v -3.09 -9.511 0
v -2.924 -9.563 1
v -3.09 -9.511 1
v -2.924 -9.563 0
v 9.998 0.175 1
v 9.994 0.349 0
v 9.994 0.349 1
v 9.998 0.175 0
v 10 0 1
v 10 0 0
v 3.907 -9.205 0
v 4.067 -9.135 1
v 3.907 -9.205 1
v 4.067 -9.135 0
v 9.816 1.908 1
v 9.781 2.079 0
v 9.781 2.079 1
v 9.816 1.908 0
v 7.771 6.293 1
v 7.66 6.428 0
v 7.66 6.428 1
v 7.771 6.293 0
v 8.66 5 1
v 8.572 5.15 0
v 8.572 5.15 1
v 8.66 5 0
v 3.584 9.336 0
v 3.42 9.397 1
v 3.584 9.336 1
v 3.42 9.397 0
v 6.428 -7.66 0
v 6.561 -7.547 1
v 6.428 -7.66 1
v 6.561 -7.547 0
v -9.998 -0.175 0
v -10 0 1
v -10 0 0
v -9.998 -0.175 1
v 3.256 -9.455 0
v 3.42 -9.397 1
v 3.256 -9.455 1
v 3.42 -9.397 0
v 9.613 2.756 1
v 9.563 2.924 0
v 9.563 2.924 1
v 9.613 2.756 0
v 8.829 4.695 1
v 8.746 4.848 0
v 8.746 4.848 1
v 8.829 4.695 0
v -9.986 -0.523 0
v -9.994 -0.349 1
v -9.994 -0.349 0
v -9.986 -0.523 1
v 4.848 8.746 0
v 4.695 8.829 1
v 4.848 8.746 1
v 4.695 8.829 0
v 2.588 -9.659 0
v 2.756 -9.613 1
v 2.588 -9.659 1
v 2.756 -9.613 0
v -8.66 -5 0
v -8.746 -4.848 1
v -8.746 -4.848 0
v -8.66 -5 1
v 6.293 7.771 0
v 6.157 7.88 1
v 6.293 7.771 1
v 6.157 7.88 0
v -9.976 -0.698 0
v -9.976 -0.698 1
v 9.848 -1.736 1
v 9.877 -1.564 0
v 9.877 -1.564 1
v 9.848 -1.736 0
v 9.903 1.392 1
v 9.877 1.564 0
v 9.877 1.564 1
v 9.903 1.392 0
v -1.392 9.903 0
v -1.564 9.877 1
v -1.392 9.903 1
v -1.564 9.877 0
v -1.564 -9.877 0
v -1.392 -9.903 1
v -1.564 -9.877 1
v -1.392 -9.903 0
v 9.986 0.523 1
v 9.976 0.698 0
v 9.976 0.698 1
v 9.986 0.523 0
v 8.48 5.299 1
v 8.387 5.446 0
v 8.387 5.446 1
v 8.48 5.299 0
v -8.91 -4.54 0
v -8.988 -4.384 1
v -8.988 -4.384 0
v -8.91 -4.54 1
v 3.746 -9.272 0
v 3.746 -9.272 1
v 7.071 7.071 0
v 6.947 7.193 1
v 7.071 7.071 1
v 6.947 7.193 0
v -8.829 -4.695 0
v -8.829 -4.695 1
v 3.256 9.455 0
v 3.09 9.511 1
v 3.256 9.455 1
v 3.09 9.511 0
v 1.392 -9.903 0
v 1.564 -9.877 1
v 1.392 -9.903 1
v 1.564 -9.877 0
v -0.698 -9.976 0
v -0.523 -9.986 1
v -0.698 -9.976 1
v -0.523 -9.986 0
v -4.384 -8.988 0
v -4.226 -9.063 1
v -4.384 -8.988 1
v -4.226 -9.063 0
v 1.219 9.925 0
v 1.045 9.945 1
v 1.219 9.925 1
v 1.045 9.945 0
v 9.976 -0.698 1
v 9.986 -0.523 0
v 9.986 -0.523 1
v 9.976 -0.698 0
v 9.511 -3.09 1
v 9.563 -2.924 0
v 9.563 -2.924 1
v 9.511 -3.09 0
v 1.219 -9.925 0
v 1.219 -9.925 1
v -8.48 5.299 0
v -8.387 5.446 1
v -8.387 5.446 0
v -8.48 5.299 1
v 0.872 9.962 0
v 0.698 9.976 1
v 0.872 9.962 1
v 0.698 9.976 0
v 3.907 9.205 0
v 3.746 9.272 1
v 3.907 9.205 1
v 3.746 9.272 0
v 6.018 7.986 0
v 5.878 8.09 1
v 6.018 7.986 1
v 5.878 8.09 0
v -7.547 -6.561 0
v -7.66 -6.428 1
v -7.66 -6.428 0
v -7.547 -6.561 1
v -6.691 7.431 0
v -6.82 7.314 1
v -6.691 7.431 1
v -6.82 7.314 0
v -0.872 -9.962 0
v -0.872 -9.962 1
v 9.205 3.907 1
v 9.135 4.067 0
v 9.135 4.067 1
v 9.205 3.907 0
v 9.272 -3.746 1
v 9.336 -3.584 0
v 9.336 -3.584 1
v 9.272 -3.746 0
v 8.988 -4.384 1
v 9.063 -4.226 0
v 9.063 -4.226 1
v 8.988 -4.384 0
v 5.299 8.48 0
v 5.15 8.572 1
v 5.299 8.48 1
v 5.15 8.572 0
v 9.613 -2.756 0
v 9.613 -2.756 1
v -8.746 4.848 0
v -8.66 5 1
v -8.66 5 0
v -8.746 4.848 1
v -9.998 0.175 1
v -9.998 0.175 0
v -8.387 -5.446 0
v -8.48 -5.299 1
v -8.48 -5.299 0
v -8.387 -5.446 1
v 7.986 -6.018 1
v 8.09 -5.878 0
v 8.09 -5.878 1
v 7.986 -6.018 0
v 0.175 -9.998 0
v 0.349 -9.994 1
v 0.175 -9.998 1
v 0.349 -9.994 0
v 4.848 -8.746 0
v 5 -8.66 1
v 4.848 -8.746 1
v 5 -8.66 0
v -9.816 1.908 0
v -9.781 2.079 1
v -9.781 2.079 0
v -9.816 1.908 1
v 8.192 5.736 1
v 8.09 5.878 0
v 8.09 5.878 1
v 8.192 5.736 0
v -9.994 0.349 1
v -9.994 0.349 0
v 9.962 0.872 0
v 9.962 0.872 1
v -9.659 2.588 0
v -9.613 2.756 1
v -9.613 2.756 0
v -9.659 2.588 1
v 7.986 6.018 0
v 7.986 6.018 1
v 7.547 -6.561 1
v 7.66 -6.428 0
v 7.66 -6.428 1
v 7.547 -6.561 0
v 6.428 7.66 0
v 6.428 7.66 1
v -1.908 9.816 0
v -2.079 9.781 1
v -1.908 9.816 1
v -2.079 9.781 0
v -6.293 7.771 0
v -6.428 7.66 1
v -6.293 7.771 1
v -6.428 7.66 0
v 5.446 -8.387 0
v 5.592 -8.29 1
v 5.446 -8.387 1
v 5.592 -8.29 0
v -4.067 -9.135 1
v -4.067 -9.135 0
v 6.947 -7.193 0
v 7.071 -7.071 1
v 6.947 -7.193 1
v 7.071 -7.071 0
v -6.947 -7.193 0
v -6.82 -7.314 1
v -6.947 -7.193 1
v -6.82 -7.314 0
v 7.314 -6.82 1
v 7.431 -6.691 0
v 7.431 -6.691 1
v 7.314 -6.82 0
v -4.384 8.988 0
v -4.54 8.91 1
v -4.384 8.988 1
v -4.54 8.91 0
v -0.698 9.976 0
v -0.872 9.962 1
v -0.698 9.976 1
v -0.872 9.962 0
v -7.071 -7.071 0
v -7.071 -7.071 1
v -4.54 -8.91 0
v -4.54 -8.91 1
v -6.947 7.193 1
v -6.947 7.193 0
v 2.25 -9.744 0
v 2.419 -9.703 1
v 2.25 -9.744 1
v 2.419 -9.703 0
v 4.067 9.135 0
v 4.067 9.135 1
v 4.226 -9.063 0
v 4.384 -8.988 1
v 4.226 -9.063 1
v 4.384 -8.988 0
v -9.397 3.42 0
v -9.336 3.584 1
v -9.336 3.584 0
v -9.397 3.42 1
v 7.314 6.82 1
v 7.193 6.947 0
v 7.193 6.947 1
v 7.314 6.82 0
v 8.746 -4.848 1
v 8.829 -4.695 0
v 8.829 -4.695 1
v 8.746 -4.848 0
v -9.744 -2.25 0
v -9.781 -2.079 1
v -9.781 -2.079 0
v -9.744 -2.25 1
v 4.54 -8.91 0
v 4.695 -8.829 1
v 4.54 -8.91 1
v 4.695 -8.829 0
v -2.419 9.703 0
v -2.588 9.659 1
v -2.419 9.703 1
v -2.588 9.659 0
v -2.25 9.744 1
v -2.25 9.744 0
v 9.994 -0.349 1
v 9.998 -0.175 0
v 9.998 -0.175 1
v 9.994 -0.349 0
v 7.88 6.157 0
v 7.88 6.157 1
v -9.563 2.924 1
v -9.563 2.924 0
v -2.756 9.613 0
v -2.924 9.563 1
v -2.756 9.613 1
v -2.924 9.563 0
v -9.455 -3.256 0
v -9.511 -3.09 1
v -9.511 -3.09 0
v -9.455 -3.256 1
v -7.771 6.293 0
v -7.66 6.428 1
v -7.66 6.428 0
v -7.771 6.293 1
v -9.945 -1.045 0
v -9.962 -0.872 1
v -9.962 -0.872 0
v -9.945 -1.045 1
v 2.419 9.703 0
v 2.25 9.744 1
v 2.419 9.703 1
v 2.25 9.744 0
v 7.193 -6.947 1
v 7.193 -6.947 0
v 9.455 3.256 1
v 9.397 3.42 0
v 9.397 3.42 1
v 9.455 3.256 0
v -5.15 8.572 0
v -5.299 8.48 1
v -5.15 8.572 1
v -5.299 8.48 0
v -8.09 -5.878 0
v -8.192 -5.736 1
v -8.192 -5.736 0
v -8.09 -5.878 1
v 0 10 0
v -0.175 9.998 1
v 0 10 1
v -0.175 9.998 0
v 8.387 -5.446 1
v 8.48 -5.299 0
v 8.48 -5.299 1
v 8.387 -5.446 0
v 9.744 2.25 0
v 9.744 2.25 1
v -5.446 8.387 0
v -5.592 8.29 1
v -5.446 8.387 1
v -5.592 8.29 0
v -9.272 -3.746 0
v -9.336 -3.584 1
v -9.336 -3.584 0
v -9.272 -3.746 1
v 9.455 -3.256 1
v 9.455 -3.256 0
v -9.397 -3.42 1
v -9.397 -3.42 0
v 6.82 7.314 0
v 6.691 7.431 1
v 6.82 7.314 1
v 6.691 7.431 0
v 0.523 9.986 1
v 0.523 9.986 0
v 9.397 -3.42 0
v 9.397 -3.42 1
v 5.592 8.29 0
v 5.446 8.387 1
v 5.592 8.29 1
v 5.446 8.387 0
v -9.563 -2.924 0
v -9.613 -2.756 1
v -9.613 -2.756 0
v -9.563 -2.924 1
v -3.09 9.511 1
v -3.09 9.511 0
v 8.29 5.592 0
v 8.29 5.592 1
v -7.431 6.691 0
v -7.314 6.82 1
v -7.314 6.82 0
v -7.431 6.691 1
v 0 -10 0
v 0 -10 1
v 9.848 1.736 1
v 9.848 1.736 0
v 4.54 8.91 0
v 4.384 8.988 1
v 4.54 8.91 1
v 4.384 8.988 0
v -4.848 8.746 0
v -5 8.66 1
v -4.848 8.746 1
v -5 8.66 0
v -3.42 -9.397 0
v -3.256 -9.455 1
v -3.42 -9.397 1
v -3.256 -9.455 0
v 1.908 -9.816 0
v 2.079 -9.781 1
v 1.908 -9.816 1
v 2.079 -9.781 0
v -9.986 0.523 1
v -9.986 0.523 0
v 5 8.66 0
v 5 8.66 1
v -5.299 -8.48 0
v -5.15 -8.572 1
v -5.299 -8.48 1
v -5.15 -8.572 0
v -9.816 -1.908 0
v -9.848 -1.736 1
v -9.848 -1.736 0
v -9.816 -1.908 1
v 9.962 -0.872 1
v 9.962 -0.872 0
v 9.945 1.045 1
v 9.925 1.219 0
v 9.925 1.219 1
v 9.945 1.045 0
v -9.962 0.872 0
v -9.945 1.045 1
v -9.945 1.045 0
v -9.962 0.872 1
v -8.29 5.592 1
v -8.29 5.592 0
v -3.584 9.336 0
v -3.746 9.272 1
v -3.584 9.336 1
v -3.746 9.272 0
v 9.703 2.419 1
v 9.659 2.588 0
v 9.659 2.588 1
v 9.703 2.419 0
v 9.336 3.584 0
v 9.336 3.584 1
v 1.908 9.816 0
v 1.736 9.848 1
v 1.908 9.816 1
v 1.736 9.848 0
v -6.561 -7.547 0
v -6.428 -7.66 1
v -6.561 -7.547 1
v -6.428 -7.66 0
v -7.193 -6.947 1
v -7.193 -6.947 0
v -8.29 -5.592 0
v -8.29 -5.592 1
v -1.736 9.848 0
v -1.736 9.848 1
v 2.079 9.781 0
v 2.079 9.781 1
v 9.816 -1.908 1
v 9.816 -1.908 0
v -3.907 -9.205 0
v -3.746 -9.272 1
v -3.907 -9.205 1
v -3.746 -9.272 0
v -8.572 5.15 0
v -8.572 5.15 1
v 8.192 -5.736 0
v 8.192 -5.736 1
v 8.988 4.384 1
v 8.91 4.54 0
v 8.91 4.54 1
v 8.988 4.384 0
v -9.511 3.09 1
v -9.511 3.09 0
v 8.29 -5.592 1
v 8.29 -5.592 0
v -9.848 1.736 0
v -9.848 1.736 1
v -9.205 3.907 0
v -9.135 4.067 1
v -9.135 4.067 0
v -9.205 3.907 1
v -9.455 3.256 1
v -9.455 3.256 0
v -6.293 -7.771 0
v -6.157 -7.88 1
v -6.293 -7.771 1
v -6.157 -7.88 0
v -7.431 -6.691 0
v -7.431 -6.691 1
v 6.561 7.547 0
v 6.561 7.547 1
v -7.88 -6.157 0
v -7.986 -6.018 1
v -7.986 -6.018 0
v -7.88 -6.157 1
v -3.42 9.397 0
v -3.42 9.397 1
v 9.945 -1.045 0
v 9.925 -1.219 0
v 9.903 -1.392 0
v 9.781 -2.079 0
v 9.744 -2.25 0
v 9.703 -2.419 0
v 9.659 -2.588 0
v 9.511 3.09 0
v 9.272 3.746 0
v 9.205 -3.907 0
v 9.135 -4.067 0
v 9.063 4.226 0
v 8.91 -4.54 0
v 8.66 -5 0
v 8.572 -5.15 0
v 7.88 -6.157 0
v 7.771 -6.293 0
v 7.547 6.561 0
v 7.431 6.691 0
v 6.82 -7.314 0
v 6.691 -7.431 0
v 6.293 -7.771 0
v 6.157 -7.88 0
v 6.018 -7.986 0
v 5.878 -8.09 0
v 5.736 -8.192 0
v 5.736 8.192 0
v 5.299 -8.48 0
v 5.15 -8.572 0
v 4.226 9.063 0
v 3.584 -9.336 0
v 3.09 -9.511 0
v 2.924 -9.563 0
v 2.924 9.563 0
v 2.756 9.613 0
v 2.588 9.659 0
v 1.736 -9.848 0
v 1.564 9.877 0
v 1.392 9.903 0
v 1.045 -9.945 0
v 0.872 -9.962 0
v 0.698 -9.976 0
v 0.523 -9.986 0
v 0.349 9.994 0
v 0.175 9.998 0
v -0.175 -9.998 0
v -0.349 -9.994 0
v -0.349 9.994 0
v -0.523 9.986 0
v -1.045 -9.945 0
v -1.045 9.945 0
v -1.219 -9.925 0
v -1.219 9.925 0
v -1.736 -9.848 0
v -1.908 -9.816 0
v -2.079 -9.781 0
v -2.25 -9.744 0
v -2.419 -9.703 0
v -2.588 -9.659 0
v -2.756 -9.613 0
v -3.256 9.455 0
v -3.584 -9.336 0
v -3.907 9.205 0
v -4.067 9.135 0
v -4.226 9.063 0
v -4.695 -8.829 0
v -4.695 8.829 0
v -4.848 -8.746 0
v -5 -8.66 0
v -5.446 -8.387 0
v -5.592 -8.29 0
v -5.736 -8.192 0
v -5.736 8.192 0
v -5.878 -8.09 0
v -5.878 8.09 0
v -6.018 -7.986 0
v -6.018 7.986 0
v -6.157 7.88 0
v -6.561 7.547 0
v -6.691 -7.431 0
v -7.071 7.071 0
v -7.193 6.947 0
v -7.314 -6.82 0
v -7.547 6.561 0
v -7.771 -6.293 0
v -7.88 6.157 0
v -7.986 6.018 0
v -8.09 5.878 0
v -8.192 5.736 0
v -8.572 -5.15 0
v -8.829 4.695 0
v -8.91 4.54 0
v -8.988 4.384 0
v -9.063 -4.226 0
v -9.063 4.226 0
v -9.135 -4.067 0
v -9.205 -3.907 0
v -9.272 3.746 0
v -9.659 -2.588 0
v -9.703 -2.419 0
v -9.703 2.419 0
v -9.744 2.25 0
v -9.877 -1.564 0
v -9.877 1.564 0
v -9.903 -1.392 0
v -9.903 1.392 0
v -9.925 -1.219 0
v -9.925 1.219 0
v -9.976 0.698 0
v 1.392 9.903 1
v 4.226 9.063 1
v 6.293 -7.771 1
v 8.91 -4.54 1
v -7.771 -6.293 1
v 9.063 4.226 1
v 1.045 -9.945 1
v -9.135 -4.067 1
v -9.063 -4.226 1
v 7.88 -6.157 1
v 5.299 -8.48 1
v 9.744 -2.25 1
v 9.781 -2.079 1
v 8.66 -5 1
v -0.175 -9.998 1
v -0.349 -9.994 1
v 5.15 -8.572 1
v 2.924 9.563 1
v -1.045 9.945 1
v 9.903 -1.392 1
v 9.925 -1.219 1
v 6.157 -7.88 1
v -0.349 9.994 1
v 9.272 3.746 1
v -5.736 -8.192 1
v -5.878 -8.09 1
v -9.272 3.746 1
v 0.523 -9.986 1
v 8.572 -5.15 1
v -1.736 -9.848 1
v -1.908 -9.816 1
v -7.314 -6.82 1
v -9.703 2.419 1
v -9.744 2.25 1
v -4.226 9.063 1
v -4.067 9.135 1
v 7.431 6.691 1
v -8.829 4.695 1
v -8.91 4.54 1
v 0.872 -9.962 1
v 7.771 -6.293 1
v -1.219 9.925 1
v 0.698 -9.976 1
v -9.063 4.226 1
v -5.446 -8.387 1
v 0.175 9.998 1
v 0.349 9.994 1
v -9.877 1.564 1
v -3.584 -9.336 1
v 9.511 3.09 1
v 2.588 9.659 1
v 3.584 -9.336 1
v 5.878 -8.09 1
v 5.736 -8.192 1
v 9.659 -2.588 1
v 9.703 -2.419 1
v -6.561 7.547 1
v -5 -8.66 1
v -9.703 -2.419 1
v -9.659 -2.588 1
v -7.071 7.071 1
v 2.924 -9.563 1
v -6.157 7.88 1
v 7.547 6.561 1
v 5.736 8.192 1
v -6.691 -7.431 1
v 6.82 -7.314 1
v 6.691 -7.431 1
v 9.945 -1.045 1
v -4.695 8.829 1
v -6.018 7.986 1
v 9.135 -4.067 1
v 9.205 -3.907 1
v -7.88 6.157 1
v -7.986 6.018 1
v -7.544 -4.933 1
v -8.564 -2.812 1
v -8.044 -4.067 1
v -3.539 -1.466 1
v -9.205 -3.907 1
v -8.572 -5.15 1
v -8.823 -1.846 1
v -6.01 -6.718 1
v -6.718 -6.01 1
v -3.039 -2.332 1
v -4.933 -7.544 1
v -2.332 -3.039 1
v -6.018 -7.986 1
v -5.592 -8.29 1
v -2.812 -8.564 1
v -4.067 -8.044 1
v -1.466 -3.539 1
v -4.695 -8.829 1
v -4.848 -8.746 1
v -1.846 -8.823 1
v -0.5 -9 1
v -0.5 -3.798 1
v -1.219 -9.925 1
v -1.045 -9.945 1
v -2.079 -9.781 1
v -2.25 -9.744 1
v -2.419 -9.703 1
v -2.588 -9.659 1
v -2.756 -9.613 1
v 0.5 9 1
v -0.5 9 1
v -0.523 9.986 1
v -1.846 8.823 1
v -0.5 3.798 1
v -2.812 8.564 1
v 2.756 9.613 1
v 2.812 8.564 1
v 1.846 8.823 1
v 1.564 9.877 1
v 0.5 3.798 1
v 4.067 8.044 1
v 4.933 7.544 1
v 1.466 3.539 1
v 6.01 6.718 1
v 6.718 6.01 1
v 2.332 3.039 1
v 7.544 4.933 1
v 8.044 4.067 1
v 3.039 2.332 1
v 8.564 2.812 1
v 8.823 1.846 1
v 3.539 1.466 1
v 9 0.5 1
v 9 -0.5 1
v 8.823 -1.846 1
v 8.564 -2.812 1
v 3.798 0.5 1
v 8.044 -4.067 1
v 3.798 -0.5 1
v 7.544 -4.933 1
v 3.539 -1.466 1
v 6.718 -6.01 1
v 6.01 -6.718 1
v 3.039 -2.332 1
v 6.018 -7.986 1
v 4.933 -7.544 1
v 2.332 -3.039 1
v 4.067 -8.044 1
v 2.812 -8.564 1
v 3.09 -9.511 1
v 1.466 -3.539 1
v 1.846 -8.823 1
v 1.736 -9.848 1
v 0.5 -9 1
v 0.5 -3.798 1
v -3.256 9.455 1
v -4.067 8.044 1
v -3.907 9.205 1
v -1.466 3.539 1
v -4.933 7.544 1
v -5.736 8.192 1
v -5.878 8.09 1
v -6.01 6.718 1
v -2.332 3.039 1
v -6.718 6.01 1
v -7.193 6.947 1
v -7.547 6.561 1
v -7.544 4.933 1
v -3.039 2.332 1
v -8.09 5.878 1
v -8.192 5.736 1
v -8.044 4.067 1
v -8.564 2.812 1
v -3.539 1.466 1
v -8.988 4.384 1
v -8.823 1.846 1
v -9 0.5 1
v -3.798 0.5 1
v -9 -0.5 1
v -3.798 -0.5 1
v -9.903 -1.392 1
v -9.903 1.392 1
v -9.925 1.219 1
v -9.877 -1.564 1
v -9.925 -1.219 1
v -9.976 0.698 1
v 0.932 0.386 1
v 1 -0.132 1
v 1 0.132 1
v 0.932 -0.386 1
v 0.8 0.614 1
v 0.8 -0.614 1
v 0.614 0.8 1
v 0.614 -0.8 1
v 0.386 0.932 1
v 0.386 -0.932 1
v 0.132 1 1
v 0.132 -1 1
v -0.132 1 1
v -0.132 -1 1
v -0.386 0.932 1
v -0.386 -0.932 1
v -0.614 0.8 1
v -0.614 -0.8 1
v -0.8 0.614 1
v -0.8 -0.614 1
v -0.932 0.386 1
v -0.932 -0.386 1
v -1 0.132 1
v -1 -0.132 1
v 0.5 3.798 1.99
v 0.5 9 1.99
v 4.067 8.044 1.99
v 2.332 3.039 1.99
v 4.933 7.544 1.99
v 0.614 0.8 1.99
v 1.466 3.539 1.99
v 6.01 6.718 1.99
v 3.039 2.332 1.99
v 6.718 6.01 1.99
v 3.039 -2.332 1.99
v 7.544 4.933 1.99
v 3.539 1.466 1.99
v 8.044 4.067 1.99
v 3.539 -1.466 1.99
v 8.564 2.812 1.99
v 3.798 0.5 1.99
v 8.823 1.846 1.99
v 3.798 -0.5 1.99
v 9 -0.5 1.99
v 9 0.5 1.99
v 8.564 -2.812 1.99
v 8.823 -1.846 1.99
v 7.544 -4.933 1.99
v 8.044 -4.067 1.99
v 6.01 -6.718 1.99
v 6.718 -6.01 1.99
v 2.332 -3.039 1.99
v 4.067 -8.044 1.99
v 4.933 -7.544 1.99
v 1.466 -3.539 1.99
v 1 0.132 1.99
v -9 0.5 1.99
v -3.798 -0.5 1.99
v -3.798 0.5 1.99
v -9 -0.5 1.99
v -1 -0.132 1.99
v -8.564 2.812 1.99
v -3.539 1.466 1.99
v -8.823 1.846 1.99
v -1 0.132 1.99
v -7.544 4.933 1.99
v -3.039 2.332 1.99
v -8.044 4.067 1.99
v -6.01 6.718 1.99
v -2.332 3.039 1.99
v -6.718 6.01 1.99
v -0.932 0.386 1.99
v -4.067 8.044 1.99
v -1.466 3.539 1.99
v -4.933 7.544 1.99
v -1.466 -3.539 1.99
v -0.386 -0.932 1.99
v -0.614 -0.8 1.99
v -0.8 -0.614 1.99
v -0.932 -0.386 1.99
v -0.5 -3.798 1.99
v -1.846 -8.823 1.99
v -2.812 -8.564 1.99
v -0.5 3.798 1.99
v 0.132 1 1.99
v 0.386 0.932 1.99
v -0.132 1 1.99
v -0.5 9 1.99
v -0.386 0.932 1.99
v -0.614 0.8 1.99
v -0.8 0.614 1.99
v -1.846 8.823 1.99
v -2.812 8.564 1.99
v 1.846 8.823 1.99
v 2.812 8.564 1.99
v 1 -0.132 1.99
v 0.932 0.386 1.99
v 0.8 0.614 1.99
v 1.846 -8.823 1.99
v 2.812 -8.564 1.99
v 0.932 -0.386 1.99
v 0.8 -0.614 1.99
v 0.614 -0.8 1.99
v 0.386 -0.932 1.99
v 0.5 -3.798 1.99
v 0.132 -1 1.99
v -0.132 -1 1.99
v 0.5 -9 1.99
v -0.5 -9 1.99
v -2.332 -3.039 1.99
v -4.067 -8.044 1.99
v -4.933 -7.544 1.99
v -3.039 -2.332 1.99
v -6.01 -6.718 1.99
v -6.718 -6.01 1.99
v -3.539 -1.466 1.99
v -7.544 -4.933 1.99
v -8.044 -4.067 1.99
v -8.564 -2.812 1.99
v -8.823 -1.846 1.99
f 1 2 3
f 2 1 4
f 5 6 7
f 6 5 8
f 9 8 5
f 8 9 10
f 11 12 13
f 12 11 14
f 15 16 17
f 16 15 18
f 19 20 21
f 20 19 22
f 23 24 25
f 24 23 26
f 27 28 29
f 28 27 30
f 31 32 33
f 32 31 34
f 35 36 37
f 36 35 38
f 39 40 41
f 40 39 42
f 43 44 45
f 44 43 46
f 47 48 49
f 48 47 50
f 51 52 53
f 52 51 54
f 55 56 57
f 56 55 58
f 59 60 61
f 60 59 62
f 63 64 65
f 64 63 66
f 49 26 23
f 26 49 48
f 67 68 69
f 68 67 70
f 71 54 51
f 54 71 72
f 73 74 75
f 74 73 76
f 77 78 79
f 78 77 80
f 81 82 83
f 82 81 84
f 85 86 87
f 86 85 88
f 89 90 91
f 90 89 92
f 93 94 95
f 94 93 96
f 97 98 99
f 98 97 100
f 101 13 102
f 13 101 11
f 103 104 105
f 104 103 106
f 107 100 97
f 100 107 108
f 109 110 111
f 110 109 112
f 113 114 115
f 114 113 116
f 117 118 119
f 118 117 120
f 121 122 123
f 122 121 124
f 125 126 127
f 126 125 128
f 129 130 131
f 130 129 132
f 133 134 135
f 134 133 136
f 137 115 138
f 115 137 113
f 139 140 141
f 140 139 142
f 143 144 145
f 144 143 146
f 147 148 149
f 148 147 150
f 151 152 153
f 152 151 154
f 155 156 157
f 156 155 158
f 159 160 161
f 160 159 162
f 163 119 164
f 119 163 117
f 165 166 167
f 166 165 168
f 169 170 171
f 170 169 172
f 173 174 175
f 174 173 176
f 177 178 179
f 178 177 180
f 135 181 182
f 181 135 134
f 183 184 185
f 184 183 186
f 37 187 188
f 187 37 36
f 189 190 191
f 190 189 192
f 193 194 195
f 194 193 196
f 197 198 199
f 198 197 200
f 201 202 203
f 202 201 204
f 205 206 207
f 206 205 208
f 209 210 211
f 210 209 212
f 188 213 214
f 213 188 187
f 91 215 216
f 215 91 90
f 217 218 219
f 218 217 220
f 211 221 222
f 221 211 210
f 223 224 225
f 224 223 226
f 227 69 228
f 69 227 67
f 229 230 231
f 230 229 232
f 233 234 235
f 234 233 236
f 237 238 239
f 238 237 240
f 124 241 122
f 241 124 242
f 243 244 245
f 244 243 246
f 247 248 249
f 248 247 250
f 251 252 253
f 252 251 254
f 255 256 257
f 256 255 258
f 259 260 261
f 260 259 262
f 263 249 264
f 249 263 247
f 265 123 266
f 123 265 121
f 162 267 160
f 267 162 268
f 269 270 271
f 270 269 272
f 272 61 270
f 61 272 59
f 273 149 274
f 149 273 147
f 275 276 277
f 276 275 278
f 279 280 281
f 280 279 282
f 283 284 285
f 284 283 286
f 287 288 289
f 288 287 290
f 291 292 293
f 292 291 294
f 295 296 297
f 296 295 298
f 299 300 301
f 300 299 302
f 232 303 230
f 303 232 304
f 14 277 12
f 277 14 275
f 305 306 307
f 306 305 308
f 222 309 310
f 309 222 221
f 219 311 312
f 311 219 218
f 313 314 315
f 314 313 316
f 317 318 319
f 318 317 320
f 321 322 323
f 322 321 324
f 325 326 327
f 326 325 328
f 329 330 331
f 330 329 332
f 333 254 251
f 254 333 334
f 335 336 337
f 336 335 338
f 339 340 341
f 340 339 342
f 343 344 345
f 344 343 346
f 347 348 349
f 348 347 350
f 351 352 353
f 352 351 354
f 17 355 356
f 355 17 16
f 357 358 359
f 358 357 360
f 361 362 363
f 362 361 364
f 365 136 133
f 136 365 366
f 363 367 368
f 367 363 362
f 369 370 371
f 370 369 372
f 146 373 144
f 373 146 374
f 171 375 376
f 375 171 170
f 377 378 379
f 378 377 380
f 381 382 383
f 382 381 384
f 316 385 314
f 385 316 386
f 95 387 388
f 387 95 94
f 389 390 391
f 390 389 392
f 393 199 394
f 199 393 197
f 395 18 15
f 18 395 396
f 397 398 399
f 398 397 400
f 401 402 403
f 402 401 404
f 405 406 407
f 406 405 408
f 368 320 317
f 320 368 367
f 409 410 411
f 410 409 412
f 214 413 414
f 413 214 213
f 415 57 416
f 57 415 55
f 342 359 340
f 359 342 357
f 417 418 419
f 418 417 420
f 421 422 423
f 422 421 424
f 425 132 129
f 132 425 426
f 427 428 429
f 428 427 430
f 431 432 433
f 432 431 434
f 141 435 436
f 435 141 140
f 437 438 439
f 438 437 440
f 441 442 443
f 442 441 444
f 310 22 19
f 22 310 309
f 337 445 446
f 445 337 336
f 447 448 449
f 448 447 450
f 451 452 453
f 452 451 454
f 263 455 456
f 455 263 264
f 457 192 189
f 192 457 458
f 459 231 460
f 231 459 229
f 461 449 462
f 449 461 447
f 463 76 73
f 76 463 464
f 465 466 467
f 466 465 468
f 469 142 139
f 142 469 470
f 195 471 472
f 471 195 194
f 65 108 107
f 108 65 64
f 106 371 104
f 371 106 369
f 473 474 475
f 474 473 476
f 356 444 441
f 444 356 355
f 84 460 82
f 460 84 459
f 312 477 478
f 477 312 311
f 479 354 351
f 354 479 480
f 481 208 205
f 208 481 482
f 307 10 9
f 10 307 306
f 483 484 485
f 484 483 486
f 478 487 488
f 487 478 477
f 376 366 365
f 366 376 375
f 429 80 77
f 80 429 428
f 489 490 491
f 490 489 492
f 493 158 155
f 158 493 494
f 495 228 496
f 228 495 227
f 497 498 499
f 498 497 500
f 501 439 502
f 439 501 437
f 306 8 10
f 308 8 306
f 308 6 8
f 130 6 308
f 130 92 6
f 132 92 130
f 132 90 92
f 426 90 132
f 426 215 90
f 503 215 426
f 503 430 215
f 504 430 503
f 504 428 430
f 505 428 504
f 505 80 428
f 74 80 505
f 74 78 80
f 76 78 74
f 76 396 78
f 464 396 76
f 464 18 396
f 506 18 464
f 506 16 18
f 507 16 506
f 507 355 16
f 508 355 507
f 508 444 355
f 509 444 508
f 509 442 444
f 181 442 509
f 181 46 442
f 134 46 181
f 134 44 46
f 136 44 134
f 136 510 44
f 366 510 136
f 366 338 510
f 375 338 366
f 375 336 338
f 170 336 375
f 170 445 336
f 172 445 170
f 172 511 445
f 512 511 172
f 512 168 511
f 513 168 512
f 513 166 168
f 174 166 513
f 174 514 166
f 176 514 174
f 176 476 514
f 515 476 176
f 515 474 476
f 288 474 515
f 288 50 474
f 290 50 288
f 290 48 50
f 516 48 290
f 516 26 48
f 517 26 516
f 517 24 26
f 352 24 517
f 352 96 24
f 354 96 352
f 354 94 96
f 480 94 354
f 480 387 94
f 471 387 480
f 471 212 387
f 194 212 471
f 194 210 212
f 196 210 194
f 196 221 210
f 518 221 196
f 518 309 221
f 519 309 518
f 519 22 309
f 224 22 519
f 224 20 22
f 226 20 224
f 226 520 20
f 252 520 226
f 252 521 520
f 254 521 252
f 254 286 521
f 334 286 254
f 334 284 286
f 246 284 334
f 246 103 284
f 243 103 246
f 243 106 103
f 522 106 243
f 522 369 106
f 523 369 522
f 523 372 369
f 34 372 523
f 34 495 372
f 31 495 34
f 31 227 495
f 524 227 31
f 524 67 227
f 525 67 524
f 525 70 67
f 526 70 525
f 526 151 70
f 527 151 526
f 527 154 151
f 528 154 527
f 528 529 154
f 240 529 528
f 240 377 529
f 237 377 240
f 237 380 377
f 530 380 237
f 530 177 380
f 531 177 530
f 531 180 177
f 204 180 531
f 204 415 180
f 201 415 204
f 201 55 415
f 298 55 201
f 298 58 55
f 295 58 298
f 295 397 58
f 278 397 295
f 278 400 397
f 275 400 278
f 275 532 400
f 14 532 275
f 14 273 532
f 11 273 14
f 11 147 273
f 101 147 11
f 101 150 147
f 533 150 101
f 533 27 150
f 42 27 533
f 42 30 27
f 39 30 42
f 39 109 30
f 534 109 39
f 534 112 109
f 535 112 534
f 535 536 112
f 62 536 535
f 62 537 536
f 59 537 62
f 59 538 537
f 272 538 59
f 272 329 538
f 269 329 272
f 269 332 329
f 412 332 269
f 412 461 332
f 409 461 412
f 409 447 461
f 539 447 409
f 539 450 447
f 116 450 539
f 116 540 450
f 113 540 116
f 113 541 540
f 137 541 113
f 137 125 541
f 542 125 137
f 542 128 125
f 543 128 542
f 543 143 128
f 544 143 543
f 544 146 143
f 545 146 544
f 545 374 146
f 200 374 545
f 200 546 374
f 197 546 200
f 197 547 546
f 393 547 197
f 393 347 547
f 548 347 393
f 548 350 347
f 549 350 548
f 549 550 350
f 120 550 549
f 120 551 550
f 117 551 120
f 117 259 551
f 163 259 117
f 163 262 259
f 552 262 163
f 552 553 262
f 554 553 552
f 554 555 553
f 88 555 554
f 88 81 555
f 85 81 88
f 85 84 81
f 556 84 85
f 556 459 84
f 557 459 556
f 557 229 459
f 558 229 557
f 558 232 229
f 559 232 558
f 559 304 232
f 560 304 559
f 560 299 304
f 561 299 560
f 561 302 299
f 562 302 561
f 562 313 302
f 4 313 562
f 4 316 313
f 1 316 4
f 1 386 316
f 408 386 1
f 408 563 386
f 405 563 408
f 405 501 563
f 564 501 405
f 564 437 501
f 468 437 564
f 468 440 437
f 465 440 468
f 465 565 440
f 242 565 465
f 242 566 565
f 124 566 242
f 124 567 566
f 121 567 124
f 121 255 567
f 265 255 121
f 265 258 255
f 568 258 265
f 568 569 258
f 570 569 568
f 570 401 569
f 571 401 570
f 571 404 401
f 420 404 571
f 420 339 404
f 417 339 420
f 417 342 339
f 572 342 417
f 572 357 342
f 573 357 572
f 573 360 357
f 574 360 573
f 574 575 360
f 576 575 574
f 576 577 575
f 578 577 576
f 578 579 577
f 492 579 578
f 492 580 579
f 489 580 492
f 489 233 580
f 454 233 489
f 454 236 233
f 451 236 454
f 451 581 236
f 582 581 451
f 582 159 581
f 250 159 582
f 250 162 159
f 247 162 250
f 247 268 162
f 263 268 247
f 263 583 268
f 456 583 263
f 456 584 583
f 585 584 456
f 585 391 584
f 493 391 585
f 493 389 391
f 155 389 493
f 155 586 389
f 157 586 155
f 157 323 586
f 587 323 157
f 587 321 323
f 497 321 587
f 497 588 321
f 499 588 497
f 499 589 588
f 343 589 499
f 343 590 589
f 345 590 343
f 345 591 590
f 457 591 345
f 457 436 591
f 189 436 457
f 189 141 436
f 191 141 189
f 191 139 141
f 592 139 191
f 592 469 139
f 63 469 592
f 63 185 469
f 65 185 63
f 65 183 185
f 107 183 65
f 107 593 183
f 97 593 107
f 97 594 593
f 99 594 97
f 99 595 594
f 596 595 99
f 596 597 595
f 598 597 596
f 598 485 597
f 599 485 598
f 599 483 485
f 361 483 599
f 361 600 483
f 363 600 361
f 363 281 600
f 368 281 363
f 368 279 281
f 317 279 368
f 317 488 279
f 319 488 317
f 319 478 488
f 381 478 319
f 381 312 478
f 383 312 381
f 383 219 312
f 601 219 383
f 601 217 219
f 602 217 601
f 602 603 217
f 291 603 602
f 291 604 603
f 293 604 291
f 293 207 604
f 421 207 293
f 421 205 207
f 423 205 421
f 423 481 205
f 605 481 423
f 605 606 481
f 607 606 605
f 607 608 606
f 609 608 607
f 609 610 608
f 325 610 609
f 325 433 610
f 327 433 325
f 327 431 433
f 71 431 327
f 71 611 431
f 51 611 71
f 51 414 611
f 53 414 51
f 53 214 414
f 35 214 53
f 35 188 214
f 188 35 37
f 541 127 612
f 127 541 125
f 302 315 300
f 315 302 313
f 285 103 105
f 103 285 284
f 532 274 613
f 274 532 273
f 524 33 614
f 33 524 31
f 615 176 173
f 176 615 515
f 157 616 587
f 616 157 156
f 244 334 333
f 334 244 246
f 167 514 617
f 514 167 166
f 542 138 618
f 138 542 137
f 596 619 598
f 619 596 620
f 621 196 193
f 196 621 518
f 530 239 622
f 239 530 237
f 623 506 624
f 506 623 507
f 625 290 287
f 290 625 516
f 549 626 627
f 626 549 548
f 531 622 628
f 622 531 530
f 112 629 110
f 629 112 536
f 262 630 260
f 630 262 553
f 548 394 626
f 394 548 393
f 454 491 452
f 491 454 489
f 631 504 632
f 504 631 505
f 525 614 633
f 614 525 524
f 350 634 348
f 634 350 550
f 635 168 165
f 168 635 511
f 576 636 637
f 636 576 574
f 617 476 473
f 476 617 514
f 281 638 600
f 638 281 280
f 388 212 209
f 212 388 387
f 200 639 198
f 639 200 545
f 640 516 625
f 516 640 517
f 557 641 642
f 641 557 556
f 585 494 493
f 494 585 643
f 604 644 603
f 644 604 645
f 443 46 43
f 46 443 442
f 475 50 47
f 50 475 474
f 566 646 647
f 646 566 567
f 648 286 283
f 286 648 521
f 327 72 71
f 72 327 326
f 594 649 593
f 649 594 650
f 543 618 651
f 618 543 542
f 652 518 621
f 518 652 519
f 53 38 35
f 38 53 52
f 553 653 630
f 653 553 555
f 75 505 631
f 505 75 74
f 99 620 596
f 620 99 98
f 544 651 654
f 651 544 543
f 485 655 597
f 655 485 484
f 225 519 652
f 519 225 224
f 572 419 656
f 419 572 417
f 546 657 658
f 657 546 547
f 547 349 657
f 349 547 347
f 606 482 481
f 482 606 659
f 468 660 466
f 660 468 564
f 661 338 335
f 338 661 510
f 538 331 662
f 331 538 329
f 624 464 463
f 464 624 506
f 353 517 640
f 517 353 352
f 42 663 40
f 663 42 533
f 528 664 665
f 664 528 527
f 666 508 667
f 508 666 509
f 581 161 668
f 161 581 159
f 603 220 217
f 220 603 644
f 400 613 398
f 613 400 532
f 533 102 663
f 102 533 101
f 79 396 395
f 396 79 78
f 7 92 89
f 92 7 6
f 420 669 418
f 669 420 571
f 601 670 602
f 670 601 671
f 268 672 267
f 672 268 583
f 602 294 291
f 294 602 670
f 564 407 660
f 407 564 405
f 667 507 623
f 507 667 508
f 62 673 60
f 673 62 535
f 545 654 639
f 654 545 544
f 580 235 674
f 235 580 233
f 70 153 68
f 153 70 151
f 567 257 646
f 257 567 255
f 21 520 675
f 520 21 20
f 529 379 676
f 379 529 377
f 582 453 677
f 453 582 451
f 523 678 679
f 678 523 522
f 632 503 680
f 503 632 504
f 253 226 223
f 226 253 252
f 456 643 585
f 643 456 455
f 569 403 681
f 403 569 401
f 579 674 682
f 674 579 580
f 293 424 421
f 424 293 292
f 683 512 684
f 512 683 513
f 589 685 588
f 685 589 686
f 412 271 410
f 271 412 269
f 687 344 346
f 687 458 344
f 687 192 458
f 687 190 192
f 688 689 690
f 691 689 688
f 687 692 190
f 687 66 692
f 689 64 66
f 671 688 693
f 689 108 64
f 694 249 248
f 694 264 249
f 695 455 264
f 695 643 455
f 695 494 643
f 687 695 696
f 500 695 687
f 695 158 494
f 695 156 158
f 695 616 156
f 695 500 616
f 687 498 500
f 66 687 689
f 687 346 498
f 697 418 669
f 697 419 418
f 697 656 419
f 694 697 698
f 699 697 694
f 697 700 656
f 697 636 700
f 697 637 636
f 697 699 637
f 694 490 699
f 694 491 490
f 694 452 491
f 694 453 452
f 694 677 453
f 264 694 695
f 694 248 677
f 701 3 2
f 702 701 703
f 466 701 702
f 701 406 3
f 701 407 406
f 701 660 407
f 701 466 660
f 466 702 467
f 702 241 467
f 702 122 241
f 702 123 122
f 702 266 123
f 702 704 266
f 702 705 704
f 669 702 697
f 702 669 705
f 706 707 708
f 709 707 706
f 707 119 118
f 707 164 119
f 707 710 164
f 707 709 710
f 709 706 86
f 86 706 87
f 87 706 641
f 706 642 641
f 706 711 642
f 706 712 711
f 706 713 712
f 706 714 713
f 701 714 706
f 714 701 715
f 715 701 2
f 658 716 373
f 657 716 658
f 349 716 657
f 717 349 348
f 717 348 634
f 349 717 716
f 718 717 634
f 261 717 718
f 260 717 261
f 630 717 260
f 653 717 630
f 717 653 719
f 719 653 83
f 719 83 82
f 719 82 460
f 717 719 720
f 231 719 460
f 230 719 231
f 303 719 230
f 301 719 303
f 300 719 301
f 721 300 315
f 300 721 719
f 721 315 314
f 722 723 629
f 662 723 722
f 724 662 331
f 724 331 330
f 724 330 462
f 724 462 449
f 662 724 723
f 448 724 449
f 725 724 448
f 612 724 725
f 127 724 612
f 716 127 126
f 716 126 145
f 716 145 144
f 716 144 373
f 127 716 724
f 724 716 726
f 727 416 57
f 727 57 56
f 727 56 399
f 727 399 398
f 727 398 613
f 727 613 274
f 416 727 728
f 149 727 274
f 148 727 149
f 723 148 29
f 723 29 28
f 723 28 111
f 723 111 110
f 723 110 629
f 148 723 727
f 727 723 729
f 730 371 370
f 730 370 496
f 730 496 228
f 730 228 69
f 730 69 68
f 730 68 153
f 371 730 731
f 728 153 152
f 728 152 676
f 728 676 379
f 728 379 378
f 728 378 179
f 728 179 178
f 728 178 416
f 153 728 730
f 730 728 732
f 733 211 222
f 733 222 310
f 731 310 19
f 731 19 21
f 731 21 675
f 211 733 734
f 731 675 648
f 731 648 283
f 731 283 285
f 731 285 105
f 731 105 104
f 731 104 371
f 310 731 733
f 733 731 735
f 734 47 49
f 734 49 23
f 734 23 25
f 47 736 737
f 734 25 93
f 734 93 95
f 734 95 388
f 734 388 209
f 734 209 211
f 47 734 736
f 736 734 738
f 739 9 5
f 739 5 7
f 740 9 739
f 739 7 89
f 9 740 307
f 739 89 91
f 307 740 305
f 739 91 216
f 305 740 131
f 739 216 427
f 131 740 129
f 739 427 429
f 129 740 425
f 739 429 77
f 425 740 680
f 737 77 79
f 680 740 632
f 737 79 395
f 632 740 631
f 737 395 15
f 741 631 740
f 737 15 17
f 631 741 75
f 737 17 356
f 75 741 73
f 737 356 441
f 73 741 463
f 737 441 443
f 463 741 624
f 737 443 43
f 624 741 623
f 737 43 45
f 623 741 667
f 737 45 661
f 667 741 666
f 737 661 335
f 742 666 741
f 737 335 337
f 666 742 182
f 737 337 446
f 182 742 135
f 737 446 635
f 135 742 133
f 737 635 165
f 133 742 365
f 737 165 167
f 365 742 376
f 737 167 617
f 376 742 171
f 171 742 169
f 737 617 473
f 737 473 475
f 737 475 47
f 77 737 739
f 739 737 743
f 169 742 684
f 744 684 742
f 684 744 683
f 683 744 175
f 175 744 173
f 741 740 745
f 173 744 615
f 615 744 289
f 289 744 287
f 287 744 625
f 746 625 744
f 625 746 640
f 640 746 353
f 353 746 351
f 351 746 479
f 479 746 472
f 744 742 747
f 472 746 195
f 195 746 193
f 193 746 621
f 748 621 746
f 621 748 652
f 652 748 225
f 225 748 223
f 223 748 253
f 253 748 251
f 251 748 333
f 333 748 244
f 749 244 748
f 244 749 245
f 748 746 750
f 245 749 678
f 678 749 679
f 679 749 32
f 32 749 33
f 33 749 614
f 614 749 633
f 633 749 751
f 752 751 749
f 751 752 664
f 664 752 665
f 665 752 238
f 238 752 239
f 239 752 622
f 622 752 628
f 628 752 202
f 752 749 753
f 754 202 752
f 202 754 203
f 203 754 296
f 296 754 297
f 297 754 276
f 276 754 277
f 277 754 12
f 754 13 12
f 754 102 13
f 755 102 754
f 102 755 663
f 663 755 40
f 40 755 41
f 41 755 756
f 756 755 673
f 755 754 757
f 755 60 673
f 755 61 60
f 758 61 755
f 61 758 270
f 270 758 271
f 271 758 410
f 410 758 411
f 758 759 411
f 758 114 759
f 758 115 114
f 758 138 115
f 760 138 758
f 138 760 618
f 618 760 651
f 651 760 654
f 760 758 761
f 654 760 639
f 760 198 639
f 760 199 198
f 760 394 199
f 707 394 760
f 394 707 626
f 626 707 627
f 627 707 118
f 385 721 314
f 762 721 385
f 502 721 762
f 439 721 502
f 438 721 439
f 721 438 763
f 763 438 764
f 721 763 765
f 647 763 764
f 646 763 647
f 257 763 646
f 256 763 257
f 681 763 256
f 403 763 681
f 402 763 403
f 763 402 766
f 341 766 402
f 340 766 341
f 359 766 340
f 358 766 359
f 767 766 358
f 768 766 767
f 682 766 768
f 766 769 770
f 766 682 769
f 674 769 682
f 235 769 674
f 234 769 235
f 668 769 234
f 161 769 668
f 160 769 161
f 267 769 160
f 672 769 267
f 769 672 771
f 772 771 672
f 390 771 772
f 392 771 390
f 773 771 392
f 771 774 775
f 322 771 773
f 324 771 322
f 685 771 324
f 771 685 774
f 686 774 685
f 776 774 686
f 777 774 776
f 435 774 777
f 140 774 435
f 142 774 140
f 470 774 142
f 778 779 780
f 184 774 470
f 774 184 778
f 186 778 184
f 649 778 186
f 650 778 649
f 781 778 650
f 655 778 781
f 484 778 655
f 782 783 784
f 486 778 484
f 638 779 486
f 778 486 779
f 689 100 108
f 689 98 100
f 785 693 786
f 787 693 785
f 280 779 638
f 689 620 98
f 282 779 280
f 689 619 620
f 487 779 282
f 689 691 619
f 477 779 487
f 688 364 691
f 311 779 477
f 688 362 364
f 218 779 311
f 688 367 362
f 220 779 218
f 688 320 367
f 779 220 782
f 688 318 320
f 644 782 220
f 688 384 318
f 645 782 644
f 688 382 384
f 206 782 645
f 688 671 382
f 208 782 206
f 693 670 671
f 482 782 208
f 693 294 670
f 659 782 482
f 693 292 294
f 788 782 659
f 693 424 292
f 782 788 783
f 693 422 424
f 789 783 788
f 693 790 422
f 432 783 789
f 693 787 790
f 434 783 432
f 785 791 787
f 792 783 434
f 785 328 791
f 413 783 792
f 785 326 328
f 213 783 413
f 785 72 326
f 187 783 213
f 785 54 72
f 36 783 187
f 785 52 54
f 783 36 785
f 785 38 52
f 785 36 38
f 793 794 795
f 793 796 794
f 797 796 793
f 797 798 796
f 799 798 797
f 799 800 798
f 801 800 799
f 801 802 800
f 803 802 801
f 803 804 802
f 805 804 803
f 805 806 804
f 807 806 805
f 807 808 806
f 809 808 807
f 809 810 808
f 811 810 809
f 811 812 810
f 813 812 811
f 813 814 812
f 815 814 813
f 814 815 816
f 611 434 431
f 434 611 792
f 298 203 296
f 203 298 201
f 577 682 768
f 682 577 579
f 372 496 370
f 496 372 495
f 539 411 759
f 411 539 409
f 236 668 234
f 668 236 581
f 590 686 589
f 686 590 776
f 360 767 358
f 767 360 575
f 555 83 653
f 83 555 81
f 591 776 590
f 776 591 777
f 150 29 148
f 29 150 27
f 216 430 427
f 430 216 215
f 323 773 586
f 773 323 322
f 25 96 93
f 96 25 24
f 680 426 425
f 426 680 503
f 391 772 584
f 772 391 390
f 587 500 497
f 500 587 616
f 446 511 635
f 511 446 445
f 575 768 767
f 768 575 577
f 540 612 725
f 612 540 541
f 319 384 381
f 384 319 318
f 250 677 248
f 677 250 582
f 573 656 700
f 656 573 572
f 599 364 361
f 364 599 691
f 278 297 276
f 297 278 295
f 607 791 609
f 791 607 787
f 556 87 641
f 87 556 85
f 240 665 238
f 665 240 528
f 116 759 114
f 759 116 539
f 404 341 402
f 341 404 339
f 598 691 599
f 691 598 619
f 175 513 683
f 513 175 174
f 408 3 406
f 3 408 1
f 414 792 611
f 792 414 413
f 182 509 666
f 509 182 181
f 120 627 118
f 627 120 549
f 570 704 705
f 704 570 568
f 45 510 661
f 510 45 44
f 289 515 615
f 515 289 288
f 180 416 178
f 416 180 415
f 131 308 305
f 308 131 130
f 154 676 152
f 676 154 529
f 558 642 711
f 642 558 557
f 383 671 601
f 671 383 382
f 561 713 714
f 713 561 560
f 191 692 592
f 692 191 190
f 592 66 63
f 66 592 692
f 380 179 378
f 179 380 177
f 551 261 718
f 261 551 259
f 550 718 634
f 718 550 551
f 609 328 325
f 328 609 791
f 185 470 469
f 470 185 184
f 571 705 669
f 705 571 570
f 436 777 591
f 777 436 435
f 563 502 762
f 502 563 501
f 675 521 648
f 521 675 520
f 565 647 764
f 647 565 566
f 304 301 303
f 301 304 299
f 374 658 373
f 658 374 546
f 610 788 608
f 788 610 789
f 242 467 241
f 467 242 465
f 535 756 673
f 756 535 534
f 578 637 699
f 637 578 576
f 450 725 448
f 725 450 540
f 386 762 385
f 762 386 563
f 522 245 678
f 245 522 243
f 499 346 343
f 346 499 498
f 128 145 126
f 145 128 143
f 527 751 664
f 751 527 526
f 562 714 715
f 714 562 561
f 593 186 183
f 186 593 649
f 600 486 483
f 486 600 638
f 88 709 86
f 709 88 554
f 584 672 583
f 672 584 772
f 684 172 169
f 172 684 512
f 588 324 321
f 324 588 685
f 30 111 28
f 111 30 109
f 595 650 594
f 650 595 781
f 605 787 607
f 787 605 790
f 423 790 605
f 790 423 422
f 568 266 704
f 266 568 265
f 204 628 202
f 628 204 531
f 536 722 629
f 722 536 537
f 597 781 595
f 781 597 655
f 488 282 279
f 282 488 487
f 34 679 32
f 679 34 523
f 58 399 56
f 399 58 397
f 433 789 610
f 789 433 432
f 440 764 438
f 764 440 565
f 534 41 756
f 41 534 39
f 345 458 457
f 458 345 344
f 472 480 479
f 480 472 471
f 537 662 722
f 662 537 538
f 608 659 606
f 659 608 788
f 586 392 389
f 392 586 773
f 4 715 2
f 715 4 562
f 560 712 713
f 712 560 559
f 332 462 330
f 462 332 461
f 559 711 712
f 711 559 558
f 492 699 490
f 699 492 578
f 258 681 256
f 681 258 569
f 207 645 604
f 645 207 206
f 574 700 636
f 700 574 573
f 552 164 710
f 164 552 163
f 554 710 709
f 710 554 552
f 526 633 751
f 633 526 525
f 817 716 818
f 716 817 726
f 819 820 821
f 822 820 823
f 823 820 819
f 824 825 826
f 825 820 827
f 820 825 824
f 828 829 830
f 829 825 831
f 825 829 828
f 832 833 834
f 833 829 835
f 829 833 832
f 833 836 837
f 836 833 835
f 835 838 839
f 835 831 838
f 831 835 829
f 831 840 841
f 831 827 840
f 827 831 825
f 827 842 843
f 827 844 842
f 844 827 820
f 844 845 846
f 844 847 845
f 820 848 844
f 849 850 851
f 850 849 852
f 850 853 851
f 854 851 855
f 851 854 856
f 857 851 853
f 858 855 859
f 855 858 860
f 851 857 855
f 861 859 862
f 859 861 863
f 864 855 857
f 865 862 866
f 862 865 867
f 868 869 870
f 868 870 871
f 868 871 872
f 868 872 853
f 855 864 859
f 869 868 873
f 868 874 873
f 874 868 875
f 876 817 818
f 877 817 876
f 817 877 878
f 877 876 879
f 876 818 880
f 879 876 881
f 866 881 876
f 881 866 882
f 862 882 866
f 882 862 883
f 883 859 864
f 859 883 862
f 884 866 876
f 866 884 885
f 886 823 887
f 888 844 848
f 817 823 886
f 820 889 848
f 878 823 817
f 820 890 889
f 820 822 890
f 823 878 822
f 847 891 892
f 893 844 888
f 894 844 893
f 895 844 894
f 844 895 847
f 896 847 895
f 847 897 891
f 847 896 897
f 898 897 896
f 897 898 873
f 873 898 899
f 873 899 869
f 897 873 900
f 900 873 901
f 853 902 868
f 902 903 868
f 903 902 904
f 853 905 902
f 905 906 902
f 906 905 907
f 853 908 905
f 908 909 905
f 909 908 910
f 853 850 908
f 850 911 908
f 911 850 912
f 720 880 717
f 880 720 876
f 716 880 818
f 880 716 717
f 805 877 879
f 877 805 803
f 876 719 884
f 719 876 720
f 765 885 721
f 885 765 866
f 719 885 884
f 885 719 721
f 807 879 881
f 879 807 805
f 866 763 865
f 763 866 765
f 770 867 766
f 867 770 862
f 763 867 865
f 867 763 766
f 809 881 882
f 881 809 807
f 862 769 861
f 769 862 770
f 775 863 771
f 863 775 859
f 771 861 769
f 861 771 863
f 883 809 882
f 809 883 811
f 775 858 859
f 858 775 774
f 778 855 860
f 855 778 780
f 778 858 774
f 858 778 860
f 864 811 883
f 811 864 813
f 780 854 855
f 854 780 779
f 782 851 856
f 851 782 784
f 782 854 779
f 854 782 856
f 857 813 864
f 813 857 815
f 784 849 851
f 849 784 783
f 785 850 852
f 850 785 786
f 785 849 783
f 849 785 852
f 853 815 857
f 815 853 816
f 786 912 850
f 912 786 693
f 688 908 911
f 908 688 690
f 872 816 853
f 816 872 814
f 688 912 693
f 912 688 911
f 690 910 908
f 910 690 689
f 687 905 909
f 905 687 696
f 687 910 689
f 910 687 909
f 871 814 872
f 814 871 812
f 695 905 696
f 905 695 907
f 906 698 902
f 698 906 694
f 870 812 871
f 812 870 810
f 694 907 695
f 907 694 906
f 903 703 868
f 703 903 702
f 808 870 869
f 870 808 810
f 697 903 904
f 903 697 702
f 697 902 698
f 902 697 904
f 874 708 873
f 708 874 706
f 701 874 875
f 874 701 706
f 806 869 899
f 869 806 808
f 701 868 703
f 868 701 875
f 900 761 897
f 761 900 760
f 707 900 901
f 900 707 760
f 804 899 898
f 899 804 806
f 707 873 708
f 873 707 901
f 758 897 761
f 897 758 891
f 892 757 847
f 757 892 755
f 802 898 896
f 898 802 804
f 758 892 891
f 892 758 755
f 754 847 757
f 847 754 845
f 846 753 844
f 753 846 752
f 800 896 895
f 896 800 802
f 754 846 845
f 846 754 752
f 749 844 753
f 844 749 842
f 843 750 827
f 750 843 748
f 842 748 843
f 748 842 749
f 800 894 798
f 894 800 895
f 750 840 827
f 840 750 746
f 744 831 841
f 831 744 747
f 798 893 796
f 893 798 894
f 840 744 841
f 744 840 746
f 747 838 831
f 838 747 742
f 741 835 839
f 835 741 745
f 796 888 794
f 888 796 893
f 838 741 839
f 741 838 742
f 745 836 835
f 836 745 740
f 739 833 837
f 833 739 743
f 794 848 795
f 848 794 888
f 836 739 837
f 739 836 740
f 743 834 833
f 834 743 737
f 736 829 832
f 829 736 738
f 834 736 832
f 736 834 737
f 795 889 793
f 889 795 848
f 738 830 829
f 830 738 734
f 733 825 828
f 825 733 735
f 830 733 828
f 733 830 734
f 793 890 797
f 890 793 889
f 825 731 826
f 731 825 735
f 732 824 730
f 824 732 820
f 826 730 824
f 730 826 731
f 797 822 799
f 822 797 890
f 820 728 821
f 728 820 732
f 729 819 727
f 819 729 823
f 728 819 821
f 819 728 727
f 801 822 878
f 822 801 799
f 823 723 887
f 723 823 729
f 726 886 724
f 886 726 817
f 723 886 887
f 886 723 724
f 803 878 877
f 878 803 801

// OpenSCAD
unit="first";  // [first:mm,second:inch] 


//outer diameter is 20mm more
innerDiametermm=0; //[0:180]


//outer diameter is 1 inch more
innerDiameterinch=0; //[0:7]
//1/16 inch
innerDiameter16stinch=0; //[0:15]

makePart();

module makePart(){
    if(unit=="first"){
        smm(innerDiametermm);
    }
    else{
        sinch(innerDiameterinch,innerDiameter16stinch);
    }
}



module smm(d){
    difference(){
        cylinder(1,d/2+10,d/2+10,$fn=360);
        translate([0,0,-1])
         cylinder(3,d/2,d/2,$fn=360);
        
        }
        
    for(i=[0:15:345])
    rotate(a=i,v=[0,0,1])    
    translate([-0.5,d/2+1,0.99])   
    cube([1,8,1]);
}

module sinch(da,db){
    difference(){
        cylinder(1,(da+db/16)*25.4/2+12.7,(da+db/16)*25.4/2+12.7,$fn=360);
        translate([0,0,-1])
         cylinder(3,(da+db/16)*25.4/2,(da+db/16)*24.4/2,$fn=360);
        
        }
        
    for(i=[0:15:345])
    rotate(a=i,v=[0,0,1])    
    translate([-0.5,(da+db/16)*25.4/2+1,0.99])   
    cube([1,10,1]);
}
